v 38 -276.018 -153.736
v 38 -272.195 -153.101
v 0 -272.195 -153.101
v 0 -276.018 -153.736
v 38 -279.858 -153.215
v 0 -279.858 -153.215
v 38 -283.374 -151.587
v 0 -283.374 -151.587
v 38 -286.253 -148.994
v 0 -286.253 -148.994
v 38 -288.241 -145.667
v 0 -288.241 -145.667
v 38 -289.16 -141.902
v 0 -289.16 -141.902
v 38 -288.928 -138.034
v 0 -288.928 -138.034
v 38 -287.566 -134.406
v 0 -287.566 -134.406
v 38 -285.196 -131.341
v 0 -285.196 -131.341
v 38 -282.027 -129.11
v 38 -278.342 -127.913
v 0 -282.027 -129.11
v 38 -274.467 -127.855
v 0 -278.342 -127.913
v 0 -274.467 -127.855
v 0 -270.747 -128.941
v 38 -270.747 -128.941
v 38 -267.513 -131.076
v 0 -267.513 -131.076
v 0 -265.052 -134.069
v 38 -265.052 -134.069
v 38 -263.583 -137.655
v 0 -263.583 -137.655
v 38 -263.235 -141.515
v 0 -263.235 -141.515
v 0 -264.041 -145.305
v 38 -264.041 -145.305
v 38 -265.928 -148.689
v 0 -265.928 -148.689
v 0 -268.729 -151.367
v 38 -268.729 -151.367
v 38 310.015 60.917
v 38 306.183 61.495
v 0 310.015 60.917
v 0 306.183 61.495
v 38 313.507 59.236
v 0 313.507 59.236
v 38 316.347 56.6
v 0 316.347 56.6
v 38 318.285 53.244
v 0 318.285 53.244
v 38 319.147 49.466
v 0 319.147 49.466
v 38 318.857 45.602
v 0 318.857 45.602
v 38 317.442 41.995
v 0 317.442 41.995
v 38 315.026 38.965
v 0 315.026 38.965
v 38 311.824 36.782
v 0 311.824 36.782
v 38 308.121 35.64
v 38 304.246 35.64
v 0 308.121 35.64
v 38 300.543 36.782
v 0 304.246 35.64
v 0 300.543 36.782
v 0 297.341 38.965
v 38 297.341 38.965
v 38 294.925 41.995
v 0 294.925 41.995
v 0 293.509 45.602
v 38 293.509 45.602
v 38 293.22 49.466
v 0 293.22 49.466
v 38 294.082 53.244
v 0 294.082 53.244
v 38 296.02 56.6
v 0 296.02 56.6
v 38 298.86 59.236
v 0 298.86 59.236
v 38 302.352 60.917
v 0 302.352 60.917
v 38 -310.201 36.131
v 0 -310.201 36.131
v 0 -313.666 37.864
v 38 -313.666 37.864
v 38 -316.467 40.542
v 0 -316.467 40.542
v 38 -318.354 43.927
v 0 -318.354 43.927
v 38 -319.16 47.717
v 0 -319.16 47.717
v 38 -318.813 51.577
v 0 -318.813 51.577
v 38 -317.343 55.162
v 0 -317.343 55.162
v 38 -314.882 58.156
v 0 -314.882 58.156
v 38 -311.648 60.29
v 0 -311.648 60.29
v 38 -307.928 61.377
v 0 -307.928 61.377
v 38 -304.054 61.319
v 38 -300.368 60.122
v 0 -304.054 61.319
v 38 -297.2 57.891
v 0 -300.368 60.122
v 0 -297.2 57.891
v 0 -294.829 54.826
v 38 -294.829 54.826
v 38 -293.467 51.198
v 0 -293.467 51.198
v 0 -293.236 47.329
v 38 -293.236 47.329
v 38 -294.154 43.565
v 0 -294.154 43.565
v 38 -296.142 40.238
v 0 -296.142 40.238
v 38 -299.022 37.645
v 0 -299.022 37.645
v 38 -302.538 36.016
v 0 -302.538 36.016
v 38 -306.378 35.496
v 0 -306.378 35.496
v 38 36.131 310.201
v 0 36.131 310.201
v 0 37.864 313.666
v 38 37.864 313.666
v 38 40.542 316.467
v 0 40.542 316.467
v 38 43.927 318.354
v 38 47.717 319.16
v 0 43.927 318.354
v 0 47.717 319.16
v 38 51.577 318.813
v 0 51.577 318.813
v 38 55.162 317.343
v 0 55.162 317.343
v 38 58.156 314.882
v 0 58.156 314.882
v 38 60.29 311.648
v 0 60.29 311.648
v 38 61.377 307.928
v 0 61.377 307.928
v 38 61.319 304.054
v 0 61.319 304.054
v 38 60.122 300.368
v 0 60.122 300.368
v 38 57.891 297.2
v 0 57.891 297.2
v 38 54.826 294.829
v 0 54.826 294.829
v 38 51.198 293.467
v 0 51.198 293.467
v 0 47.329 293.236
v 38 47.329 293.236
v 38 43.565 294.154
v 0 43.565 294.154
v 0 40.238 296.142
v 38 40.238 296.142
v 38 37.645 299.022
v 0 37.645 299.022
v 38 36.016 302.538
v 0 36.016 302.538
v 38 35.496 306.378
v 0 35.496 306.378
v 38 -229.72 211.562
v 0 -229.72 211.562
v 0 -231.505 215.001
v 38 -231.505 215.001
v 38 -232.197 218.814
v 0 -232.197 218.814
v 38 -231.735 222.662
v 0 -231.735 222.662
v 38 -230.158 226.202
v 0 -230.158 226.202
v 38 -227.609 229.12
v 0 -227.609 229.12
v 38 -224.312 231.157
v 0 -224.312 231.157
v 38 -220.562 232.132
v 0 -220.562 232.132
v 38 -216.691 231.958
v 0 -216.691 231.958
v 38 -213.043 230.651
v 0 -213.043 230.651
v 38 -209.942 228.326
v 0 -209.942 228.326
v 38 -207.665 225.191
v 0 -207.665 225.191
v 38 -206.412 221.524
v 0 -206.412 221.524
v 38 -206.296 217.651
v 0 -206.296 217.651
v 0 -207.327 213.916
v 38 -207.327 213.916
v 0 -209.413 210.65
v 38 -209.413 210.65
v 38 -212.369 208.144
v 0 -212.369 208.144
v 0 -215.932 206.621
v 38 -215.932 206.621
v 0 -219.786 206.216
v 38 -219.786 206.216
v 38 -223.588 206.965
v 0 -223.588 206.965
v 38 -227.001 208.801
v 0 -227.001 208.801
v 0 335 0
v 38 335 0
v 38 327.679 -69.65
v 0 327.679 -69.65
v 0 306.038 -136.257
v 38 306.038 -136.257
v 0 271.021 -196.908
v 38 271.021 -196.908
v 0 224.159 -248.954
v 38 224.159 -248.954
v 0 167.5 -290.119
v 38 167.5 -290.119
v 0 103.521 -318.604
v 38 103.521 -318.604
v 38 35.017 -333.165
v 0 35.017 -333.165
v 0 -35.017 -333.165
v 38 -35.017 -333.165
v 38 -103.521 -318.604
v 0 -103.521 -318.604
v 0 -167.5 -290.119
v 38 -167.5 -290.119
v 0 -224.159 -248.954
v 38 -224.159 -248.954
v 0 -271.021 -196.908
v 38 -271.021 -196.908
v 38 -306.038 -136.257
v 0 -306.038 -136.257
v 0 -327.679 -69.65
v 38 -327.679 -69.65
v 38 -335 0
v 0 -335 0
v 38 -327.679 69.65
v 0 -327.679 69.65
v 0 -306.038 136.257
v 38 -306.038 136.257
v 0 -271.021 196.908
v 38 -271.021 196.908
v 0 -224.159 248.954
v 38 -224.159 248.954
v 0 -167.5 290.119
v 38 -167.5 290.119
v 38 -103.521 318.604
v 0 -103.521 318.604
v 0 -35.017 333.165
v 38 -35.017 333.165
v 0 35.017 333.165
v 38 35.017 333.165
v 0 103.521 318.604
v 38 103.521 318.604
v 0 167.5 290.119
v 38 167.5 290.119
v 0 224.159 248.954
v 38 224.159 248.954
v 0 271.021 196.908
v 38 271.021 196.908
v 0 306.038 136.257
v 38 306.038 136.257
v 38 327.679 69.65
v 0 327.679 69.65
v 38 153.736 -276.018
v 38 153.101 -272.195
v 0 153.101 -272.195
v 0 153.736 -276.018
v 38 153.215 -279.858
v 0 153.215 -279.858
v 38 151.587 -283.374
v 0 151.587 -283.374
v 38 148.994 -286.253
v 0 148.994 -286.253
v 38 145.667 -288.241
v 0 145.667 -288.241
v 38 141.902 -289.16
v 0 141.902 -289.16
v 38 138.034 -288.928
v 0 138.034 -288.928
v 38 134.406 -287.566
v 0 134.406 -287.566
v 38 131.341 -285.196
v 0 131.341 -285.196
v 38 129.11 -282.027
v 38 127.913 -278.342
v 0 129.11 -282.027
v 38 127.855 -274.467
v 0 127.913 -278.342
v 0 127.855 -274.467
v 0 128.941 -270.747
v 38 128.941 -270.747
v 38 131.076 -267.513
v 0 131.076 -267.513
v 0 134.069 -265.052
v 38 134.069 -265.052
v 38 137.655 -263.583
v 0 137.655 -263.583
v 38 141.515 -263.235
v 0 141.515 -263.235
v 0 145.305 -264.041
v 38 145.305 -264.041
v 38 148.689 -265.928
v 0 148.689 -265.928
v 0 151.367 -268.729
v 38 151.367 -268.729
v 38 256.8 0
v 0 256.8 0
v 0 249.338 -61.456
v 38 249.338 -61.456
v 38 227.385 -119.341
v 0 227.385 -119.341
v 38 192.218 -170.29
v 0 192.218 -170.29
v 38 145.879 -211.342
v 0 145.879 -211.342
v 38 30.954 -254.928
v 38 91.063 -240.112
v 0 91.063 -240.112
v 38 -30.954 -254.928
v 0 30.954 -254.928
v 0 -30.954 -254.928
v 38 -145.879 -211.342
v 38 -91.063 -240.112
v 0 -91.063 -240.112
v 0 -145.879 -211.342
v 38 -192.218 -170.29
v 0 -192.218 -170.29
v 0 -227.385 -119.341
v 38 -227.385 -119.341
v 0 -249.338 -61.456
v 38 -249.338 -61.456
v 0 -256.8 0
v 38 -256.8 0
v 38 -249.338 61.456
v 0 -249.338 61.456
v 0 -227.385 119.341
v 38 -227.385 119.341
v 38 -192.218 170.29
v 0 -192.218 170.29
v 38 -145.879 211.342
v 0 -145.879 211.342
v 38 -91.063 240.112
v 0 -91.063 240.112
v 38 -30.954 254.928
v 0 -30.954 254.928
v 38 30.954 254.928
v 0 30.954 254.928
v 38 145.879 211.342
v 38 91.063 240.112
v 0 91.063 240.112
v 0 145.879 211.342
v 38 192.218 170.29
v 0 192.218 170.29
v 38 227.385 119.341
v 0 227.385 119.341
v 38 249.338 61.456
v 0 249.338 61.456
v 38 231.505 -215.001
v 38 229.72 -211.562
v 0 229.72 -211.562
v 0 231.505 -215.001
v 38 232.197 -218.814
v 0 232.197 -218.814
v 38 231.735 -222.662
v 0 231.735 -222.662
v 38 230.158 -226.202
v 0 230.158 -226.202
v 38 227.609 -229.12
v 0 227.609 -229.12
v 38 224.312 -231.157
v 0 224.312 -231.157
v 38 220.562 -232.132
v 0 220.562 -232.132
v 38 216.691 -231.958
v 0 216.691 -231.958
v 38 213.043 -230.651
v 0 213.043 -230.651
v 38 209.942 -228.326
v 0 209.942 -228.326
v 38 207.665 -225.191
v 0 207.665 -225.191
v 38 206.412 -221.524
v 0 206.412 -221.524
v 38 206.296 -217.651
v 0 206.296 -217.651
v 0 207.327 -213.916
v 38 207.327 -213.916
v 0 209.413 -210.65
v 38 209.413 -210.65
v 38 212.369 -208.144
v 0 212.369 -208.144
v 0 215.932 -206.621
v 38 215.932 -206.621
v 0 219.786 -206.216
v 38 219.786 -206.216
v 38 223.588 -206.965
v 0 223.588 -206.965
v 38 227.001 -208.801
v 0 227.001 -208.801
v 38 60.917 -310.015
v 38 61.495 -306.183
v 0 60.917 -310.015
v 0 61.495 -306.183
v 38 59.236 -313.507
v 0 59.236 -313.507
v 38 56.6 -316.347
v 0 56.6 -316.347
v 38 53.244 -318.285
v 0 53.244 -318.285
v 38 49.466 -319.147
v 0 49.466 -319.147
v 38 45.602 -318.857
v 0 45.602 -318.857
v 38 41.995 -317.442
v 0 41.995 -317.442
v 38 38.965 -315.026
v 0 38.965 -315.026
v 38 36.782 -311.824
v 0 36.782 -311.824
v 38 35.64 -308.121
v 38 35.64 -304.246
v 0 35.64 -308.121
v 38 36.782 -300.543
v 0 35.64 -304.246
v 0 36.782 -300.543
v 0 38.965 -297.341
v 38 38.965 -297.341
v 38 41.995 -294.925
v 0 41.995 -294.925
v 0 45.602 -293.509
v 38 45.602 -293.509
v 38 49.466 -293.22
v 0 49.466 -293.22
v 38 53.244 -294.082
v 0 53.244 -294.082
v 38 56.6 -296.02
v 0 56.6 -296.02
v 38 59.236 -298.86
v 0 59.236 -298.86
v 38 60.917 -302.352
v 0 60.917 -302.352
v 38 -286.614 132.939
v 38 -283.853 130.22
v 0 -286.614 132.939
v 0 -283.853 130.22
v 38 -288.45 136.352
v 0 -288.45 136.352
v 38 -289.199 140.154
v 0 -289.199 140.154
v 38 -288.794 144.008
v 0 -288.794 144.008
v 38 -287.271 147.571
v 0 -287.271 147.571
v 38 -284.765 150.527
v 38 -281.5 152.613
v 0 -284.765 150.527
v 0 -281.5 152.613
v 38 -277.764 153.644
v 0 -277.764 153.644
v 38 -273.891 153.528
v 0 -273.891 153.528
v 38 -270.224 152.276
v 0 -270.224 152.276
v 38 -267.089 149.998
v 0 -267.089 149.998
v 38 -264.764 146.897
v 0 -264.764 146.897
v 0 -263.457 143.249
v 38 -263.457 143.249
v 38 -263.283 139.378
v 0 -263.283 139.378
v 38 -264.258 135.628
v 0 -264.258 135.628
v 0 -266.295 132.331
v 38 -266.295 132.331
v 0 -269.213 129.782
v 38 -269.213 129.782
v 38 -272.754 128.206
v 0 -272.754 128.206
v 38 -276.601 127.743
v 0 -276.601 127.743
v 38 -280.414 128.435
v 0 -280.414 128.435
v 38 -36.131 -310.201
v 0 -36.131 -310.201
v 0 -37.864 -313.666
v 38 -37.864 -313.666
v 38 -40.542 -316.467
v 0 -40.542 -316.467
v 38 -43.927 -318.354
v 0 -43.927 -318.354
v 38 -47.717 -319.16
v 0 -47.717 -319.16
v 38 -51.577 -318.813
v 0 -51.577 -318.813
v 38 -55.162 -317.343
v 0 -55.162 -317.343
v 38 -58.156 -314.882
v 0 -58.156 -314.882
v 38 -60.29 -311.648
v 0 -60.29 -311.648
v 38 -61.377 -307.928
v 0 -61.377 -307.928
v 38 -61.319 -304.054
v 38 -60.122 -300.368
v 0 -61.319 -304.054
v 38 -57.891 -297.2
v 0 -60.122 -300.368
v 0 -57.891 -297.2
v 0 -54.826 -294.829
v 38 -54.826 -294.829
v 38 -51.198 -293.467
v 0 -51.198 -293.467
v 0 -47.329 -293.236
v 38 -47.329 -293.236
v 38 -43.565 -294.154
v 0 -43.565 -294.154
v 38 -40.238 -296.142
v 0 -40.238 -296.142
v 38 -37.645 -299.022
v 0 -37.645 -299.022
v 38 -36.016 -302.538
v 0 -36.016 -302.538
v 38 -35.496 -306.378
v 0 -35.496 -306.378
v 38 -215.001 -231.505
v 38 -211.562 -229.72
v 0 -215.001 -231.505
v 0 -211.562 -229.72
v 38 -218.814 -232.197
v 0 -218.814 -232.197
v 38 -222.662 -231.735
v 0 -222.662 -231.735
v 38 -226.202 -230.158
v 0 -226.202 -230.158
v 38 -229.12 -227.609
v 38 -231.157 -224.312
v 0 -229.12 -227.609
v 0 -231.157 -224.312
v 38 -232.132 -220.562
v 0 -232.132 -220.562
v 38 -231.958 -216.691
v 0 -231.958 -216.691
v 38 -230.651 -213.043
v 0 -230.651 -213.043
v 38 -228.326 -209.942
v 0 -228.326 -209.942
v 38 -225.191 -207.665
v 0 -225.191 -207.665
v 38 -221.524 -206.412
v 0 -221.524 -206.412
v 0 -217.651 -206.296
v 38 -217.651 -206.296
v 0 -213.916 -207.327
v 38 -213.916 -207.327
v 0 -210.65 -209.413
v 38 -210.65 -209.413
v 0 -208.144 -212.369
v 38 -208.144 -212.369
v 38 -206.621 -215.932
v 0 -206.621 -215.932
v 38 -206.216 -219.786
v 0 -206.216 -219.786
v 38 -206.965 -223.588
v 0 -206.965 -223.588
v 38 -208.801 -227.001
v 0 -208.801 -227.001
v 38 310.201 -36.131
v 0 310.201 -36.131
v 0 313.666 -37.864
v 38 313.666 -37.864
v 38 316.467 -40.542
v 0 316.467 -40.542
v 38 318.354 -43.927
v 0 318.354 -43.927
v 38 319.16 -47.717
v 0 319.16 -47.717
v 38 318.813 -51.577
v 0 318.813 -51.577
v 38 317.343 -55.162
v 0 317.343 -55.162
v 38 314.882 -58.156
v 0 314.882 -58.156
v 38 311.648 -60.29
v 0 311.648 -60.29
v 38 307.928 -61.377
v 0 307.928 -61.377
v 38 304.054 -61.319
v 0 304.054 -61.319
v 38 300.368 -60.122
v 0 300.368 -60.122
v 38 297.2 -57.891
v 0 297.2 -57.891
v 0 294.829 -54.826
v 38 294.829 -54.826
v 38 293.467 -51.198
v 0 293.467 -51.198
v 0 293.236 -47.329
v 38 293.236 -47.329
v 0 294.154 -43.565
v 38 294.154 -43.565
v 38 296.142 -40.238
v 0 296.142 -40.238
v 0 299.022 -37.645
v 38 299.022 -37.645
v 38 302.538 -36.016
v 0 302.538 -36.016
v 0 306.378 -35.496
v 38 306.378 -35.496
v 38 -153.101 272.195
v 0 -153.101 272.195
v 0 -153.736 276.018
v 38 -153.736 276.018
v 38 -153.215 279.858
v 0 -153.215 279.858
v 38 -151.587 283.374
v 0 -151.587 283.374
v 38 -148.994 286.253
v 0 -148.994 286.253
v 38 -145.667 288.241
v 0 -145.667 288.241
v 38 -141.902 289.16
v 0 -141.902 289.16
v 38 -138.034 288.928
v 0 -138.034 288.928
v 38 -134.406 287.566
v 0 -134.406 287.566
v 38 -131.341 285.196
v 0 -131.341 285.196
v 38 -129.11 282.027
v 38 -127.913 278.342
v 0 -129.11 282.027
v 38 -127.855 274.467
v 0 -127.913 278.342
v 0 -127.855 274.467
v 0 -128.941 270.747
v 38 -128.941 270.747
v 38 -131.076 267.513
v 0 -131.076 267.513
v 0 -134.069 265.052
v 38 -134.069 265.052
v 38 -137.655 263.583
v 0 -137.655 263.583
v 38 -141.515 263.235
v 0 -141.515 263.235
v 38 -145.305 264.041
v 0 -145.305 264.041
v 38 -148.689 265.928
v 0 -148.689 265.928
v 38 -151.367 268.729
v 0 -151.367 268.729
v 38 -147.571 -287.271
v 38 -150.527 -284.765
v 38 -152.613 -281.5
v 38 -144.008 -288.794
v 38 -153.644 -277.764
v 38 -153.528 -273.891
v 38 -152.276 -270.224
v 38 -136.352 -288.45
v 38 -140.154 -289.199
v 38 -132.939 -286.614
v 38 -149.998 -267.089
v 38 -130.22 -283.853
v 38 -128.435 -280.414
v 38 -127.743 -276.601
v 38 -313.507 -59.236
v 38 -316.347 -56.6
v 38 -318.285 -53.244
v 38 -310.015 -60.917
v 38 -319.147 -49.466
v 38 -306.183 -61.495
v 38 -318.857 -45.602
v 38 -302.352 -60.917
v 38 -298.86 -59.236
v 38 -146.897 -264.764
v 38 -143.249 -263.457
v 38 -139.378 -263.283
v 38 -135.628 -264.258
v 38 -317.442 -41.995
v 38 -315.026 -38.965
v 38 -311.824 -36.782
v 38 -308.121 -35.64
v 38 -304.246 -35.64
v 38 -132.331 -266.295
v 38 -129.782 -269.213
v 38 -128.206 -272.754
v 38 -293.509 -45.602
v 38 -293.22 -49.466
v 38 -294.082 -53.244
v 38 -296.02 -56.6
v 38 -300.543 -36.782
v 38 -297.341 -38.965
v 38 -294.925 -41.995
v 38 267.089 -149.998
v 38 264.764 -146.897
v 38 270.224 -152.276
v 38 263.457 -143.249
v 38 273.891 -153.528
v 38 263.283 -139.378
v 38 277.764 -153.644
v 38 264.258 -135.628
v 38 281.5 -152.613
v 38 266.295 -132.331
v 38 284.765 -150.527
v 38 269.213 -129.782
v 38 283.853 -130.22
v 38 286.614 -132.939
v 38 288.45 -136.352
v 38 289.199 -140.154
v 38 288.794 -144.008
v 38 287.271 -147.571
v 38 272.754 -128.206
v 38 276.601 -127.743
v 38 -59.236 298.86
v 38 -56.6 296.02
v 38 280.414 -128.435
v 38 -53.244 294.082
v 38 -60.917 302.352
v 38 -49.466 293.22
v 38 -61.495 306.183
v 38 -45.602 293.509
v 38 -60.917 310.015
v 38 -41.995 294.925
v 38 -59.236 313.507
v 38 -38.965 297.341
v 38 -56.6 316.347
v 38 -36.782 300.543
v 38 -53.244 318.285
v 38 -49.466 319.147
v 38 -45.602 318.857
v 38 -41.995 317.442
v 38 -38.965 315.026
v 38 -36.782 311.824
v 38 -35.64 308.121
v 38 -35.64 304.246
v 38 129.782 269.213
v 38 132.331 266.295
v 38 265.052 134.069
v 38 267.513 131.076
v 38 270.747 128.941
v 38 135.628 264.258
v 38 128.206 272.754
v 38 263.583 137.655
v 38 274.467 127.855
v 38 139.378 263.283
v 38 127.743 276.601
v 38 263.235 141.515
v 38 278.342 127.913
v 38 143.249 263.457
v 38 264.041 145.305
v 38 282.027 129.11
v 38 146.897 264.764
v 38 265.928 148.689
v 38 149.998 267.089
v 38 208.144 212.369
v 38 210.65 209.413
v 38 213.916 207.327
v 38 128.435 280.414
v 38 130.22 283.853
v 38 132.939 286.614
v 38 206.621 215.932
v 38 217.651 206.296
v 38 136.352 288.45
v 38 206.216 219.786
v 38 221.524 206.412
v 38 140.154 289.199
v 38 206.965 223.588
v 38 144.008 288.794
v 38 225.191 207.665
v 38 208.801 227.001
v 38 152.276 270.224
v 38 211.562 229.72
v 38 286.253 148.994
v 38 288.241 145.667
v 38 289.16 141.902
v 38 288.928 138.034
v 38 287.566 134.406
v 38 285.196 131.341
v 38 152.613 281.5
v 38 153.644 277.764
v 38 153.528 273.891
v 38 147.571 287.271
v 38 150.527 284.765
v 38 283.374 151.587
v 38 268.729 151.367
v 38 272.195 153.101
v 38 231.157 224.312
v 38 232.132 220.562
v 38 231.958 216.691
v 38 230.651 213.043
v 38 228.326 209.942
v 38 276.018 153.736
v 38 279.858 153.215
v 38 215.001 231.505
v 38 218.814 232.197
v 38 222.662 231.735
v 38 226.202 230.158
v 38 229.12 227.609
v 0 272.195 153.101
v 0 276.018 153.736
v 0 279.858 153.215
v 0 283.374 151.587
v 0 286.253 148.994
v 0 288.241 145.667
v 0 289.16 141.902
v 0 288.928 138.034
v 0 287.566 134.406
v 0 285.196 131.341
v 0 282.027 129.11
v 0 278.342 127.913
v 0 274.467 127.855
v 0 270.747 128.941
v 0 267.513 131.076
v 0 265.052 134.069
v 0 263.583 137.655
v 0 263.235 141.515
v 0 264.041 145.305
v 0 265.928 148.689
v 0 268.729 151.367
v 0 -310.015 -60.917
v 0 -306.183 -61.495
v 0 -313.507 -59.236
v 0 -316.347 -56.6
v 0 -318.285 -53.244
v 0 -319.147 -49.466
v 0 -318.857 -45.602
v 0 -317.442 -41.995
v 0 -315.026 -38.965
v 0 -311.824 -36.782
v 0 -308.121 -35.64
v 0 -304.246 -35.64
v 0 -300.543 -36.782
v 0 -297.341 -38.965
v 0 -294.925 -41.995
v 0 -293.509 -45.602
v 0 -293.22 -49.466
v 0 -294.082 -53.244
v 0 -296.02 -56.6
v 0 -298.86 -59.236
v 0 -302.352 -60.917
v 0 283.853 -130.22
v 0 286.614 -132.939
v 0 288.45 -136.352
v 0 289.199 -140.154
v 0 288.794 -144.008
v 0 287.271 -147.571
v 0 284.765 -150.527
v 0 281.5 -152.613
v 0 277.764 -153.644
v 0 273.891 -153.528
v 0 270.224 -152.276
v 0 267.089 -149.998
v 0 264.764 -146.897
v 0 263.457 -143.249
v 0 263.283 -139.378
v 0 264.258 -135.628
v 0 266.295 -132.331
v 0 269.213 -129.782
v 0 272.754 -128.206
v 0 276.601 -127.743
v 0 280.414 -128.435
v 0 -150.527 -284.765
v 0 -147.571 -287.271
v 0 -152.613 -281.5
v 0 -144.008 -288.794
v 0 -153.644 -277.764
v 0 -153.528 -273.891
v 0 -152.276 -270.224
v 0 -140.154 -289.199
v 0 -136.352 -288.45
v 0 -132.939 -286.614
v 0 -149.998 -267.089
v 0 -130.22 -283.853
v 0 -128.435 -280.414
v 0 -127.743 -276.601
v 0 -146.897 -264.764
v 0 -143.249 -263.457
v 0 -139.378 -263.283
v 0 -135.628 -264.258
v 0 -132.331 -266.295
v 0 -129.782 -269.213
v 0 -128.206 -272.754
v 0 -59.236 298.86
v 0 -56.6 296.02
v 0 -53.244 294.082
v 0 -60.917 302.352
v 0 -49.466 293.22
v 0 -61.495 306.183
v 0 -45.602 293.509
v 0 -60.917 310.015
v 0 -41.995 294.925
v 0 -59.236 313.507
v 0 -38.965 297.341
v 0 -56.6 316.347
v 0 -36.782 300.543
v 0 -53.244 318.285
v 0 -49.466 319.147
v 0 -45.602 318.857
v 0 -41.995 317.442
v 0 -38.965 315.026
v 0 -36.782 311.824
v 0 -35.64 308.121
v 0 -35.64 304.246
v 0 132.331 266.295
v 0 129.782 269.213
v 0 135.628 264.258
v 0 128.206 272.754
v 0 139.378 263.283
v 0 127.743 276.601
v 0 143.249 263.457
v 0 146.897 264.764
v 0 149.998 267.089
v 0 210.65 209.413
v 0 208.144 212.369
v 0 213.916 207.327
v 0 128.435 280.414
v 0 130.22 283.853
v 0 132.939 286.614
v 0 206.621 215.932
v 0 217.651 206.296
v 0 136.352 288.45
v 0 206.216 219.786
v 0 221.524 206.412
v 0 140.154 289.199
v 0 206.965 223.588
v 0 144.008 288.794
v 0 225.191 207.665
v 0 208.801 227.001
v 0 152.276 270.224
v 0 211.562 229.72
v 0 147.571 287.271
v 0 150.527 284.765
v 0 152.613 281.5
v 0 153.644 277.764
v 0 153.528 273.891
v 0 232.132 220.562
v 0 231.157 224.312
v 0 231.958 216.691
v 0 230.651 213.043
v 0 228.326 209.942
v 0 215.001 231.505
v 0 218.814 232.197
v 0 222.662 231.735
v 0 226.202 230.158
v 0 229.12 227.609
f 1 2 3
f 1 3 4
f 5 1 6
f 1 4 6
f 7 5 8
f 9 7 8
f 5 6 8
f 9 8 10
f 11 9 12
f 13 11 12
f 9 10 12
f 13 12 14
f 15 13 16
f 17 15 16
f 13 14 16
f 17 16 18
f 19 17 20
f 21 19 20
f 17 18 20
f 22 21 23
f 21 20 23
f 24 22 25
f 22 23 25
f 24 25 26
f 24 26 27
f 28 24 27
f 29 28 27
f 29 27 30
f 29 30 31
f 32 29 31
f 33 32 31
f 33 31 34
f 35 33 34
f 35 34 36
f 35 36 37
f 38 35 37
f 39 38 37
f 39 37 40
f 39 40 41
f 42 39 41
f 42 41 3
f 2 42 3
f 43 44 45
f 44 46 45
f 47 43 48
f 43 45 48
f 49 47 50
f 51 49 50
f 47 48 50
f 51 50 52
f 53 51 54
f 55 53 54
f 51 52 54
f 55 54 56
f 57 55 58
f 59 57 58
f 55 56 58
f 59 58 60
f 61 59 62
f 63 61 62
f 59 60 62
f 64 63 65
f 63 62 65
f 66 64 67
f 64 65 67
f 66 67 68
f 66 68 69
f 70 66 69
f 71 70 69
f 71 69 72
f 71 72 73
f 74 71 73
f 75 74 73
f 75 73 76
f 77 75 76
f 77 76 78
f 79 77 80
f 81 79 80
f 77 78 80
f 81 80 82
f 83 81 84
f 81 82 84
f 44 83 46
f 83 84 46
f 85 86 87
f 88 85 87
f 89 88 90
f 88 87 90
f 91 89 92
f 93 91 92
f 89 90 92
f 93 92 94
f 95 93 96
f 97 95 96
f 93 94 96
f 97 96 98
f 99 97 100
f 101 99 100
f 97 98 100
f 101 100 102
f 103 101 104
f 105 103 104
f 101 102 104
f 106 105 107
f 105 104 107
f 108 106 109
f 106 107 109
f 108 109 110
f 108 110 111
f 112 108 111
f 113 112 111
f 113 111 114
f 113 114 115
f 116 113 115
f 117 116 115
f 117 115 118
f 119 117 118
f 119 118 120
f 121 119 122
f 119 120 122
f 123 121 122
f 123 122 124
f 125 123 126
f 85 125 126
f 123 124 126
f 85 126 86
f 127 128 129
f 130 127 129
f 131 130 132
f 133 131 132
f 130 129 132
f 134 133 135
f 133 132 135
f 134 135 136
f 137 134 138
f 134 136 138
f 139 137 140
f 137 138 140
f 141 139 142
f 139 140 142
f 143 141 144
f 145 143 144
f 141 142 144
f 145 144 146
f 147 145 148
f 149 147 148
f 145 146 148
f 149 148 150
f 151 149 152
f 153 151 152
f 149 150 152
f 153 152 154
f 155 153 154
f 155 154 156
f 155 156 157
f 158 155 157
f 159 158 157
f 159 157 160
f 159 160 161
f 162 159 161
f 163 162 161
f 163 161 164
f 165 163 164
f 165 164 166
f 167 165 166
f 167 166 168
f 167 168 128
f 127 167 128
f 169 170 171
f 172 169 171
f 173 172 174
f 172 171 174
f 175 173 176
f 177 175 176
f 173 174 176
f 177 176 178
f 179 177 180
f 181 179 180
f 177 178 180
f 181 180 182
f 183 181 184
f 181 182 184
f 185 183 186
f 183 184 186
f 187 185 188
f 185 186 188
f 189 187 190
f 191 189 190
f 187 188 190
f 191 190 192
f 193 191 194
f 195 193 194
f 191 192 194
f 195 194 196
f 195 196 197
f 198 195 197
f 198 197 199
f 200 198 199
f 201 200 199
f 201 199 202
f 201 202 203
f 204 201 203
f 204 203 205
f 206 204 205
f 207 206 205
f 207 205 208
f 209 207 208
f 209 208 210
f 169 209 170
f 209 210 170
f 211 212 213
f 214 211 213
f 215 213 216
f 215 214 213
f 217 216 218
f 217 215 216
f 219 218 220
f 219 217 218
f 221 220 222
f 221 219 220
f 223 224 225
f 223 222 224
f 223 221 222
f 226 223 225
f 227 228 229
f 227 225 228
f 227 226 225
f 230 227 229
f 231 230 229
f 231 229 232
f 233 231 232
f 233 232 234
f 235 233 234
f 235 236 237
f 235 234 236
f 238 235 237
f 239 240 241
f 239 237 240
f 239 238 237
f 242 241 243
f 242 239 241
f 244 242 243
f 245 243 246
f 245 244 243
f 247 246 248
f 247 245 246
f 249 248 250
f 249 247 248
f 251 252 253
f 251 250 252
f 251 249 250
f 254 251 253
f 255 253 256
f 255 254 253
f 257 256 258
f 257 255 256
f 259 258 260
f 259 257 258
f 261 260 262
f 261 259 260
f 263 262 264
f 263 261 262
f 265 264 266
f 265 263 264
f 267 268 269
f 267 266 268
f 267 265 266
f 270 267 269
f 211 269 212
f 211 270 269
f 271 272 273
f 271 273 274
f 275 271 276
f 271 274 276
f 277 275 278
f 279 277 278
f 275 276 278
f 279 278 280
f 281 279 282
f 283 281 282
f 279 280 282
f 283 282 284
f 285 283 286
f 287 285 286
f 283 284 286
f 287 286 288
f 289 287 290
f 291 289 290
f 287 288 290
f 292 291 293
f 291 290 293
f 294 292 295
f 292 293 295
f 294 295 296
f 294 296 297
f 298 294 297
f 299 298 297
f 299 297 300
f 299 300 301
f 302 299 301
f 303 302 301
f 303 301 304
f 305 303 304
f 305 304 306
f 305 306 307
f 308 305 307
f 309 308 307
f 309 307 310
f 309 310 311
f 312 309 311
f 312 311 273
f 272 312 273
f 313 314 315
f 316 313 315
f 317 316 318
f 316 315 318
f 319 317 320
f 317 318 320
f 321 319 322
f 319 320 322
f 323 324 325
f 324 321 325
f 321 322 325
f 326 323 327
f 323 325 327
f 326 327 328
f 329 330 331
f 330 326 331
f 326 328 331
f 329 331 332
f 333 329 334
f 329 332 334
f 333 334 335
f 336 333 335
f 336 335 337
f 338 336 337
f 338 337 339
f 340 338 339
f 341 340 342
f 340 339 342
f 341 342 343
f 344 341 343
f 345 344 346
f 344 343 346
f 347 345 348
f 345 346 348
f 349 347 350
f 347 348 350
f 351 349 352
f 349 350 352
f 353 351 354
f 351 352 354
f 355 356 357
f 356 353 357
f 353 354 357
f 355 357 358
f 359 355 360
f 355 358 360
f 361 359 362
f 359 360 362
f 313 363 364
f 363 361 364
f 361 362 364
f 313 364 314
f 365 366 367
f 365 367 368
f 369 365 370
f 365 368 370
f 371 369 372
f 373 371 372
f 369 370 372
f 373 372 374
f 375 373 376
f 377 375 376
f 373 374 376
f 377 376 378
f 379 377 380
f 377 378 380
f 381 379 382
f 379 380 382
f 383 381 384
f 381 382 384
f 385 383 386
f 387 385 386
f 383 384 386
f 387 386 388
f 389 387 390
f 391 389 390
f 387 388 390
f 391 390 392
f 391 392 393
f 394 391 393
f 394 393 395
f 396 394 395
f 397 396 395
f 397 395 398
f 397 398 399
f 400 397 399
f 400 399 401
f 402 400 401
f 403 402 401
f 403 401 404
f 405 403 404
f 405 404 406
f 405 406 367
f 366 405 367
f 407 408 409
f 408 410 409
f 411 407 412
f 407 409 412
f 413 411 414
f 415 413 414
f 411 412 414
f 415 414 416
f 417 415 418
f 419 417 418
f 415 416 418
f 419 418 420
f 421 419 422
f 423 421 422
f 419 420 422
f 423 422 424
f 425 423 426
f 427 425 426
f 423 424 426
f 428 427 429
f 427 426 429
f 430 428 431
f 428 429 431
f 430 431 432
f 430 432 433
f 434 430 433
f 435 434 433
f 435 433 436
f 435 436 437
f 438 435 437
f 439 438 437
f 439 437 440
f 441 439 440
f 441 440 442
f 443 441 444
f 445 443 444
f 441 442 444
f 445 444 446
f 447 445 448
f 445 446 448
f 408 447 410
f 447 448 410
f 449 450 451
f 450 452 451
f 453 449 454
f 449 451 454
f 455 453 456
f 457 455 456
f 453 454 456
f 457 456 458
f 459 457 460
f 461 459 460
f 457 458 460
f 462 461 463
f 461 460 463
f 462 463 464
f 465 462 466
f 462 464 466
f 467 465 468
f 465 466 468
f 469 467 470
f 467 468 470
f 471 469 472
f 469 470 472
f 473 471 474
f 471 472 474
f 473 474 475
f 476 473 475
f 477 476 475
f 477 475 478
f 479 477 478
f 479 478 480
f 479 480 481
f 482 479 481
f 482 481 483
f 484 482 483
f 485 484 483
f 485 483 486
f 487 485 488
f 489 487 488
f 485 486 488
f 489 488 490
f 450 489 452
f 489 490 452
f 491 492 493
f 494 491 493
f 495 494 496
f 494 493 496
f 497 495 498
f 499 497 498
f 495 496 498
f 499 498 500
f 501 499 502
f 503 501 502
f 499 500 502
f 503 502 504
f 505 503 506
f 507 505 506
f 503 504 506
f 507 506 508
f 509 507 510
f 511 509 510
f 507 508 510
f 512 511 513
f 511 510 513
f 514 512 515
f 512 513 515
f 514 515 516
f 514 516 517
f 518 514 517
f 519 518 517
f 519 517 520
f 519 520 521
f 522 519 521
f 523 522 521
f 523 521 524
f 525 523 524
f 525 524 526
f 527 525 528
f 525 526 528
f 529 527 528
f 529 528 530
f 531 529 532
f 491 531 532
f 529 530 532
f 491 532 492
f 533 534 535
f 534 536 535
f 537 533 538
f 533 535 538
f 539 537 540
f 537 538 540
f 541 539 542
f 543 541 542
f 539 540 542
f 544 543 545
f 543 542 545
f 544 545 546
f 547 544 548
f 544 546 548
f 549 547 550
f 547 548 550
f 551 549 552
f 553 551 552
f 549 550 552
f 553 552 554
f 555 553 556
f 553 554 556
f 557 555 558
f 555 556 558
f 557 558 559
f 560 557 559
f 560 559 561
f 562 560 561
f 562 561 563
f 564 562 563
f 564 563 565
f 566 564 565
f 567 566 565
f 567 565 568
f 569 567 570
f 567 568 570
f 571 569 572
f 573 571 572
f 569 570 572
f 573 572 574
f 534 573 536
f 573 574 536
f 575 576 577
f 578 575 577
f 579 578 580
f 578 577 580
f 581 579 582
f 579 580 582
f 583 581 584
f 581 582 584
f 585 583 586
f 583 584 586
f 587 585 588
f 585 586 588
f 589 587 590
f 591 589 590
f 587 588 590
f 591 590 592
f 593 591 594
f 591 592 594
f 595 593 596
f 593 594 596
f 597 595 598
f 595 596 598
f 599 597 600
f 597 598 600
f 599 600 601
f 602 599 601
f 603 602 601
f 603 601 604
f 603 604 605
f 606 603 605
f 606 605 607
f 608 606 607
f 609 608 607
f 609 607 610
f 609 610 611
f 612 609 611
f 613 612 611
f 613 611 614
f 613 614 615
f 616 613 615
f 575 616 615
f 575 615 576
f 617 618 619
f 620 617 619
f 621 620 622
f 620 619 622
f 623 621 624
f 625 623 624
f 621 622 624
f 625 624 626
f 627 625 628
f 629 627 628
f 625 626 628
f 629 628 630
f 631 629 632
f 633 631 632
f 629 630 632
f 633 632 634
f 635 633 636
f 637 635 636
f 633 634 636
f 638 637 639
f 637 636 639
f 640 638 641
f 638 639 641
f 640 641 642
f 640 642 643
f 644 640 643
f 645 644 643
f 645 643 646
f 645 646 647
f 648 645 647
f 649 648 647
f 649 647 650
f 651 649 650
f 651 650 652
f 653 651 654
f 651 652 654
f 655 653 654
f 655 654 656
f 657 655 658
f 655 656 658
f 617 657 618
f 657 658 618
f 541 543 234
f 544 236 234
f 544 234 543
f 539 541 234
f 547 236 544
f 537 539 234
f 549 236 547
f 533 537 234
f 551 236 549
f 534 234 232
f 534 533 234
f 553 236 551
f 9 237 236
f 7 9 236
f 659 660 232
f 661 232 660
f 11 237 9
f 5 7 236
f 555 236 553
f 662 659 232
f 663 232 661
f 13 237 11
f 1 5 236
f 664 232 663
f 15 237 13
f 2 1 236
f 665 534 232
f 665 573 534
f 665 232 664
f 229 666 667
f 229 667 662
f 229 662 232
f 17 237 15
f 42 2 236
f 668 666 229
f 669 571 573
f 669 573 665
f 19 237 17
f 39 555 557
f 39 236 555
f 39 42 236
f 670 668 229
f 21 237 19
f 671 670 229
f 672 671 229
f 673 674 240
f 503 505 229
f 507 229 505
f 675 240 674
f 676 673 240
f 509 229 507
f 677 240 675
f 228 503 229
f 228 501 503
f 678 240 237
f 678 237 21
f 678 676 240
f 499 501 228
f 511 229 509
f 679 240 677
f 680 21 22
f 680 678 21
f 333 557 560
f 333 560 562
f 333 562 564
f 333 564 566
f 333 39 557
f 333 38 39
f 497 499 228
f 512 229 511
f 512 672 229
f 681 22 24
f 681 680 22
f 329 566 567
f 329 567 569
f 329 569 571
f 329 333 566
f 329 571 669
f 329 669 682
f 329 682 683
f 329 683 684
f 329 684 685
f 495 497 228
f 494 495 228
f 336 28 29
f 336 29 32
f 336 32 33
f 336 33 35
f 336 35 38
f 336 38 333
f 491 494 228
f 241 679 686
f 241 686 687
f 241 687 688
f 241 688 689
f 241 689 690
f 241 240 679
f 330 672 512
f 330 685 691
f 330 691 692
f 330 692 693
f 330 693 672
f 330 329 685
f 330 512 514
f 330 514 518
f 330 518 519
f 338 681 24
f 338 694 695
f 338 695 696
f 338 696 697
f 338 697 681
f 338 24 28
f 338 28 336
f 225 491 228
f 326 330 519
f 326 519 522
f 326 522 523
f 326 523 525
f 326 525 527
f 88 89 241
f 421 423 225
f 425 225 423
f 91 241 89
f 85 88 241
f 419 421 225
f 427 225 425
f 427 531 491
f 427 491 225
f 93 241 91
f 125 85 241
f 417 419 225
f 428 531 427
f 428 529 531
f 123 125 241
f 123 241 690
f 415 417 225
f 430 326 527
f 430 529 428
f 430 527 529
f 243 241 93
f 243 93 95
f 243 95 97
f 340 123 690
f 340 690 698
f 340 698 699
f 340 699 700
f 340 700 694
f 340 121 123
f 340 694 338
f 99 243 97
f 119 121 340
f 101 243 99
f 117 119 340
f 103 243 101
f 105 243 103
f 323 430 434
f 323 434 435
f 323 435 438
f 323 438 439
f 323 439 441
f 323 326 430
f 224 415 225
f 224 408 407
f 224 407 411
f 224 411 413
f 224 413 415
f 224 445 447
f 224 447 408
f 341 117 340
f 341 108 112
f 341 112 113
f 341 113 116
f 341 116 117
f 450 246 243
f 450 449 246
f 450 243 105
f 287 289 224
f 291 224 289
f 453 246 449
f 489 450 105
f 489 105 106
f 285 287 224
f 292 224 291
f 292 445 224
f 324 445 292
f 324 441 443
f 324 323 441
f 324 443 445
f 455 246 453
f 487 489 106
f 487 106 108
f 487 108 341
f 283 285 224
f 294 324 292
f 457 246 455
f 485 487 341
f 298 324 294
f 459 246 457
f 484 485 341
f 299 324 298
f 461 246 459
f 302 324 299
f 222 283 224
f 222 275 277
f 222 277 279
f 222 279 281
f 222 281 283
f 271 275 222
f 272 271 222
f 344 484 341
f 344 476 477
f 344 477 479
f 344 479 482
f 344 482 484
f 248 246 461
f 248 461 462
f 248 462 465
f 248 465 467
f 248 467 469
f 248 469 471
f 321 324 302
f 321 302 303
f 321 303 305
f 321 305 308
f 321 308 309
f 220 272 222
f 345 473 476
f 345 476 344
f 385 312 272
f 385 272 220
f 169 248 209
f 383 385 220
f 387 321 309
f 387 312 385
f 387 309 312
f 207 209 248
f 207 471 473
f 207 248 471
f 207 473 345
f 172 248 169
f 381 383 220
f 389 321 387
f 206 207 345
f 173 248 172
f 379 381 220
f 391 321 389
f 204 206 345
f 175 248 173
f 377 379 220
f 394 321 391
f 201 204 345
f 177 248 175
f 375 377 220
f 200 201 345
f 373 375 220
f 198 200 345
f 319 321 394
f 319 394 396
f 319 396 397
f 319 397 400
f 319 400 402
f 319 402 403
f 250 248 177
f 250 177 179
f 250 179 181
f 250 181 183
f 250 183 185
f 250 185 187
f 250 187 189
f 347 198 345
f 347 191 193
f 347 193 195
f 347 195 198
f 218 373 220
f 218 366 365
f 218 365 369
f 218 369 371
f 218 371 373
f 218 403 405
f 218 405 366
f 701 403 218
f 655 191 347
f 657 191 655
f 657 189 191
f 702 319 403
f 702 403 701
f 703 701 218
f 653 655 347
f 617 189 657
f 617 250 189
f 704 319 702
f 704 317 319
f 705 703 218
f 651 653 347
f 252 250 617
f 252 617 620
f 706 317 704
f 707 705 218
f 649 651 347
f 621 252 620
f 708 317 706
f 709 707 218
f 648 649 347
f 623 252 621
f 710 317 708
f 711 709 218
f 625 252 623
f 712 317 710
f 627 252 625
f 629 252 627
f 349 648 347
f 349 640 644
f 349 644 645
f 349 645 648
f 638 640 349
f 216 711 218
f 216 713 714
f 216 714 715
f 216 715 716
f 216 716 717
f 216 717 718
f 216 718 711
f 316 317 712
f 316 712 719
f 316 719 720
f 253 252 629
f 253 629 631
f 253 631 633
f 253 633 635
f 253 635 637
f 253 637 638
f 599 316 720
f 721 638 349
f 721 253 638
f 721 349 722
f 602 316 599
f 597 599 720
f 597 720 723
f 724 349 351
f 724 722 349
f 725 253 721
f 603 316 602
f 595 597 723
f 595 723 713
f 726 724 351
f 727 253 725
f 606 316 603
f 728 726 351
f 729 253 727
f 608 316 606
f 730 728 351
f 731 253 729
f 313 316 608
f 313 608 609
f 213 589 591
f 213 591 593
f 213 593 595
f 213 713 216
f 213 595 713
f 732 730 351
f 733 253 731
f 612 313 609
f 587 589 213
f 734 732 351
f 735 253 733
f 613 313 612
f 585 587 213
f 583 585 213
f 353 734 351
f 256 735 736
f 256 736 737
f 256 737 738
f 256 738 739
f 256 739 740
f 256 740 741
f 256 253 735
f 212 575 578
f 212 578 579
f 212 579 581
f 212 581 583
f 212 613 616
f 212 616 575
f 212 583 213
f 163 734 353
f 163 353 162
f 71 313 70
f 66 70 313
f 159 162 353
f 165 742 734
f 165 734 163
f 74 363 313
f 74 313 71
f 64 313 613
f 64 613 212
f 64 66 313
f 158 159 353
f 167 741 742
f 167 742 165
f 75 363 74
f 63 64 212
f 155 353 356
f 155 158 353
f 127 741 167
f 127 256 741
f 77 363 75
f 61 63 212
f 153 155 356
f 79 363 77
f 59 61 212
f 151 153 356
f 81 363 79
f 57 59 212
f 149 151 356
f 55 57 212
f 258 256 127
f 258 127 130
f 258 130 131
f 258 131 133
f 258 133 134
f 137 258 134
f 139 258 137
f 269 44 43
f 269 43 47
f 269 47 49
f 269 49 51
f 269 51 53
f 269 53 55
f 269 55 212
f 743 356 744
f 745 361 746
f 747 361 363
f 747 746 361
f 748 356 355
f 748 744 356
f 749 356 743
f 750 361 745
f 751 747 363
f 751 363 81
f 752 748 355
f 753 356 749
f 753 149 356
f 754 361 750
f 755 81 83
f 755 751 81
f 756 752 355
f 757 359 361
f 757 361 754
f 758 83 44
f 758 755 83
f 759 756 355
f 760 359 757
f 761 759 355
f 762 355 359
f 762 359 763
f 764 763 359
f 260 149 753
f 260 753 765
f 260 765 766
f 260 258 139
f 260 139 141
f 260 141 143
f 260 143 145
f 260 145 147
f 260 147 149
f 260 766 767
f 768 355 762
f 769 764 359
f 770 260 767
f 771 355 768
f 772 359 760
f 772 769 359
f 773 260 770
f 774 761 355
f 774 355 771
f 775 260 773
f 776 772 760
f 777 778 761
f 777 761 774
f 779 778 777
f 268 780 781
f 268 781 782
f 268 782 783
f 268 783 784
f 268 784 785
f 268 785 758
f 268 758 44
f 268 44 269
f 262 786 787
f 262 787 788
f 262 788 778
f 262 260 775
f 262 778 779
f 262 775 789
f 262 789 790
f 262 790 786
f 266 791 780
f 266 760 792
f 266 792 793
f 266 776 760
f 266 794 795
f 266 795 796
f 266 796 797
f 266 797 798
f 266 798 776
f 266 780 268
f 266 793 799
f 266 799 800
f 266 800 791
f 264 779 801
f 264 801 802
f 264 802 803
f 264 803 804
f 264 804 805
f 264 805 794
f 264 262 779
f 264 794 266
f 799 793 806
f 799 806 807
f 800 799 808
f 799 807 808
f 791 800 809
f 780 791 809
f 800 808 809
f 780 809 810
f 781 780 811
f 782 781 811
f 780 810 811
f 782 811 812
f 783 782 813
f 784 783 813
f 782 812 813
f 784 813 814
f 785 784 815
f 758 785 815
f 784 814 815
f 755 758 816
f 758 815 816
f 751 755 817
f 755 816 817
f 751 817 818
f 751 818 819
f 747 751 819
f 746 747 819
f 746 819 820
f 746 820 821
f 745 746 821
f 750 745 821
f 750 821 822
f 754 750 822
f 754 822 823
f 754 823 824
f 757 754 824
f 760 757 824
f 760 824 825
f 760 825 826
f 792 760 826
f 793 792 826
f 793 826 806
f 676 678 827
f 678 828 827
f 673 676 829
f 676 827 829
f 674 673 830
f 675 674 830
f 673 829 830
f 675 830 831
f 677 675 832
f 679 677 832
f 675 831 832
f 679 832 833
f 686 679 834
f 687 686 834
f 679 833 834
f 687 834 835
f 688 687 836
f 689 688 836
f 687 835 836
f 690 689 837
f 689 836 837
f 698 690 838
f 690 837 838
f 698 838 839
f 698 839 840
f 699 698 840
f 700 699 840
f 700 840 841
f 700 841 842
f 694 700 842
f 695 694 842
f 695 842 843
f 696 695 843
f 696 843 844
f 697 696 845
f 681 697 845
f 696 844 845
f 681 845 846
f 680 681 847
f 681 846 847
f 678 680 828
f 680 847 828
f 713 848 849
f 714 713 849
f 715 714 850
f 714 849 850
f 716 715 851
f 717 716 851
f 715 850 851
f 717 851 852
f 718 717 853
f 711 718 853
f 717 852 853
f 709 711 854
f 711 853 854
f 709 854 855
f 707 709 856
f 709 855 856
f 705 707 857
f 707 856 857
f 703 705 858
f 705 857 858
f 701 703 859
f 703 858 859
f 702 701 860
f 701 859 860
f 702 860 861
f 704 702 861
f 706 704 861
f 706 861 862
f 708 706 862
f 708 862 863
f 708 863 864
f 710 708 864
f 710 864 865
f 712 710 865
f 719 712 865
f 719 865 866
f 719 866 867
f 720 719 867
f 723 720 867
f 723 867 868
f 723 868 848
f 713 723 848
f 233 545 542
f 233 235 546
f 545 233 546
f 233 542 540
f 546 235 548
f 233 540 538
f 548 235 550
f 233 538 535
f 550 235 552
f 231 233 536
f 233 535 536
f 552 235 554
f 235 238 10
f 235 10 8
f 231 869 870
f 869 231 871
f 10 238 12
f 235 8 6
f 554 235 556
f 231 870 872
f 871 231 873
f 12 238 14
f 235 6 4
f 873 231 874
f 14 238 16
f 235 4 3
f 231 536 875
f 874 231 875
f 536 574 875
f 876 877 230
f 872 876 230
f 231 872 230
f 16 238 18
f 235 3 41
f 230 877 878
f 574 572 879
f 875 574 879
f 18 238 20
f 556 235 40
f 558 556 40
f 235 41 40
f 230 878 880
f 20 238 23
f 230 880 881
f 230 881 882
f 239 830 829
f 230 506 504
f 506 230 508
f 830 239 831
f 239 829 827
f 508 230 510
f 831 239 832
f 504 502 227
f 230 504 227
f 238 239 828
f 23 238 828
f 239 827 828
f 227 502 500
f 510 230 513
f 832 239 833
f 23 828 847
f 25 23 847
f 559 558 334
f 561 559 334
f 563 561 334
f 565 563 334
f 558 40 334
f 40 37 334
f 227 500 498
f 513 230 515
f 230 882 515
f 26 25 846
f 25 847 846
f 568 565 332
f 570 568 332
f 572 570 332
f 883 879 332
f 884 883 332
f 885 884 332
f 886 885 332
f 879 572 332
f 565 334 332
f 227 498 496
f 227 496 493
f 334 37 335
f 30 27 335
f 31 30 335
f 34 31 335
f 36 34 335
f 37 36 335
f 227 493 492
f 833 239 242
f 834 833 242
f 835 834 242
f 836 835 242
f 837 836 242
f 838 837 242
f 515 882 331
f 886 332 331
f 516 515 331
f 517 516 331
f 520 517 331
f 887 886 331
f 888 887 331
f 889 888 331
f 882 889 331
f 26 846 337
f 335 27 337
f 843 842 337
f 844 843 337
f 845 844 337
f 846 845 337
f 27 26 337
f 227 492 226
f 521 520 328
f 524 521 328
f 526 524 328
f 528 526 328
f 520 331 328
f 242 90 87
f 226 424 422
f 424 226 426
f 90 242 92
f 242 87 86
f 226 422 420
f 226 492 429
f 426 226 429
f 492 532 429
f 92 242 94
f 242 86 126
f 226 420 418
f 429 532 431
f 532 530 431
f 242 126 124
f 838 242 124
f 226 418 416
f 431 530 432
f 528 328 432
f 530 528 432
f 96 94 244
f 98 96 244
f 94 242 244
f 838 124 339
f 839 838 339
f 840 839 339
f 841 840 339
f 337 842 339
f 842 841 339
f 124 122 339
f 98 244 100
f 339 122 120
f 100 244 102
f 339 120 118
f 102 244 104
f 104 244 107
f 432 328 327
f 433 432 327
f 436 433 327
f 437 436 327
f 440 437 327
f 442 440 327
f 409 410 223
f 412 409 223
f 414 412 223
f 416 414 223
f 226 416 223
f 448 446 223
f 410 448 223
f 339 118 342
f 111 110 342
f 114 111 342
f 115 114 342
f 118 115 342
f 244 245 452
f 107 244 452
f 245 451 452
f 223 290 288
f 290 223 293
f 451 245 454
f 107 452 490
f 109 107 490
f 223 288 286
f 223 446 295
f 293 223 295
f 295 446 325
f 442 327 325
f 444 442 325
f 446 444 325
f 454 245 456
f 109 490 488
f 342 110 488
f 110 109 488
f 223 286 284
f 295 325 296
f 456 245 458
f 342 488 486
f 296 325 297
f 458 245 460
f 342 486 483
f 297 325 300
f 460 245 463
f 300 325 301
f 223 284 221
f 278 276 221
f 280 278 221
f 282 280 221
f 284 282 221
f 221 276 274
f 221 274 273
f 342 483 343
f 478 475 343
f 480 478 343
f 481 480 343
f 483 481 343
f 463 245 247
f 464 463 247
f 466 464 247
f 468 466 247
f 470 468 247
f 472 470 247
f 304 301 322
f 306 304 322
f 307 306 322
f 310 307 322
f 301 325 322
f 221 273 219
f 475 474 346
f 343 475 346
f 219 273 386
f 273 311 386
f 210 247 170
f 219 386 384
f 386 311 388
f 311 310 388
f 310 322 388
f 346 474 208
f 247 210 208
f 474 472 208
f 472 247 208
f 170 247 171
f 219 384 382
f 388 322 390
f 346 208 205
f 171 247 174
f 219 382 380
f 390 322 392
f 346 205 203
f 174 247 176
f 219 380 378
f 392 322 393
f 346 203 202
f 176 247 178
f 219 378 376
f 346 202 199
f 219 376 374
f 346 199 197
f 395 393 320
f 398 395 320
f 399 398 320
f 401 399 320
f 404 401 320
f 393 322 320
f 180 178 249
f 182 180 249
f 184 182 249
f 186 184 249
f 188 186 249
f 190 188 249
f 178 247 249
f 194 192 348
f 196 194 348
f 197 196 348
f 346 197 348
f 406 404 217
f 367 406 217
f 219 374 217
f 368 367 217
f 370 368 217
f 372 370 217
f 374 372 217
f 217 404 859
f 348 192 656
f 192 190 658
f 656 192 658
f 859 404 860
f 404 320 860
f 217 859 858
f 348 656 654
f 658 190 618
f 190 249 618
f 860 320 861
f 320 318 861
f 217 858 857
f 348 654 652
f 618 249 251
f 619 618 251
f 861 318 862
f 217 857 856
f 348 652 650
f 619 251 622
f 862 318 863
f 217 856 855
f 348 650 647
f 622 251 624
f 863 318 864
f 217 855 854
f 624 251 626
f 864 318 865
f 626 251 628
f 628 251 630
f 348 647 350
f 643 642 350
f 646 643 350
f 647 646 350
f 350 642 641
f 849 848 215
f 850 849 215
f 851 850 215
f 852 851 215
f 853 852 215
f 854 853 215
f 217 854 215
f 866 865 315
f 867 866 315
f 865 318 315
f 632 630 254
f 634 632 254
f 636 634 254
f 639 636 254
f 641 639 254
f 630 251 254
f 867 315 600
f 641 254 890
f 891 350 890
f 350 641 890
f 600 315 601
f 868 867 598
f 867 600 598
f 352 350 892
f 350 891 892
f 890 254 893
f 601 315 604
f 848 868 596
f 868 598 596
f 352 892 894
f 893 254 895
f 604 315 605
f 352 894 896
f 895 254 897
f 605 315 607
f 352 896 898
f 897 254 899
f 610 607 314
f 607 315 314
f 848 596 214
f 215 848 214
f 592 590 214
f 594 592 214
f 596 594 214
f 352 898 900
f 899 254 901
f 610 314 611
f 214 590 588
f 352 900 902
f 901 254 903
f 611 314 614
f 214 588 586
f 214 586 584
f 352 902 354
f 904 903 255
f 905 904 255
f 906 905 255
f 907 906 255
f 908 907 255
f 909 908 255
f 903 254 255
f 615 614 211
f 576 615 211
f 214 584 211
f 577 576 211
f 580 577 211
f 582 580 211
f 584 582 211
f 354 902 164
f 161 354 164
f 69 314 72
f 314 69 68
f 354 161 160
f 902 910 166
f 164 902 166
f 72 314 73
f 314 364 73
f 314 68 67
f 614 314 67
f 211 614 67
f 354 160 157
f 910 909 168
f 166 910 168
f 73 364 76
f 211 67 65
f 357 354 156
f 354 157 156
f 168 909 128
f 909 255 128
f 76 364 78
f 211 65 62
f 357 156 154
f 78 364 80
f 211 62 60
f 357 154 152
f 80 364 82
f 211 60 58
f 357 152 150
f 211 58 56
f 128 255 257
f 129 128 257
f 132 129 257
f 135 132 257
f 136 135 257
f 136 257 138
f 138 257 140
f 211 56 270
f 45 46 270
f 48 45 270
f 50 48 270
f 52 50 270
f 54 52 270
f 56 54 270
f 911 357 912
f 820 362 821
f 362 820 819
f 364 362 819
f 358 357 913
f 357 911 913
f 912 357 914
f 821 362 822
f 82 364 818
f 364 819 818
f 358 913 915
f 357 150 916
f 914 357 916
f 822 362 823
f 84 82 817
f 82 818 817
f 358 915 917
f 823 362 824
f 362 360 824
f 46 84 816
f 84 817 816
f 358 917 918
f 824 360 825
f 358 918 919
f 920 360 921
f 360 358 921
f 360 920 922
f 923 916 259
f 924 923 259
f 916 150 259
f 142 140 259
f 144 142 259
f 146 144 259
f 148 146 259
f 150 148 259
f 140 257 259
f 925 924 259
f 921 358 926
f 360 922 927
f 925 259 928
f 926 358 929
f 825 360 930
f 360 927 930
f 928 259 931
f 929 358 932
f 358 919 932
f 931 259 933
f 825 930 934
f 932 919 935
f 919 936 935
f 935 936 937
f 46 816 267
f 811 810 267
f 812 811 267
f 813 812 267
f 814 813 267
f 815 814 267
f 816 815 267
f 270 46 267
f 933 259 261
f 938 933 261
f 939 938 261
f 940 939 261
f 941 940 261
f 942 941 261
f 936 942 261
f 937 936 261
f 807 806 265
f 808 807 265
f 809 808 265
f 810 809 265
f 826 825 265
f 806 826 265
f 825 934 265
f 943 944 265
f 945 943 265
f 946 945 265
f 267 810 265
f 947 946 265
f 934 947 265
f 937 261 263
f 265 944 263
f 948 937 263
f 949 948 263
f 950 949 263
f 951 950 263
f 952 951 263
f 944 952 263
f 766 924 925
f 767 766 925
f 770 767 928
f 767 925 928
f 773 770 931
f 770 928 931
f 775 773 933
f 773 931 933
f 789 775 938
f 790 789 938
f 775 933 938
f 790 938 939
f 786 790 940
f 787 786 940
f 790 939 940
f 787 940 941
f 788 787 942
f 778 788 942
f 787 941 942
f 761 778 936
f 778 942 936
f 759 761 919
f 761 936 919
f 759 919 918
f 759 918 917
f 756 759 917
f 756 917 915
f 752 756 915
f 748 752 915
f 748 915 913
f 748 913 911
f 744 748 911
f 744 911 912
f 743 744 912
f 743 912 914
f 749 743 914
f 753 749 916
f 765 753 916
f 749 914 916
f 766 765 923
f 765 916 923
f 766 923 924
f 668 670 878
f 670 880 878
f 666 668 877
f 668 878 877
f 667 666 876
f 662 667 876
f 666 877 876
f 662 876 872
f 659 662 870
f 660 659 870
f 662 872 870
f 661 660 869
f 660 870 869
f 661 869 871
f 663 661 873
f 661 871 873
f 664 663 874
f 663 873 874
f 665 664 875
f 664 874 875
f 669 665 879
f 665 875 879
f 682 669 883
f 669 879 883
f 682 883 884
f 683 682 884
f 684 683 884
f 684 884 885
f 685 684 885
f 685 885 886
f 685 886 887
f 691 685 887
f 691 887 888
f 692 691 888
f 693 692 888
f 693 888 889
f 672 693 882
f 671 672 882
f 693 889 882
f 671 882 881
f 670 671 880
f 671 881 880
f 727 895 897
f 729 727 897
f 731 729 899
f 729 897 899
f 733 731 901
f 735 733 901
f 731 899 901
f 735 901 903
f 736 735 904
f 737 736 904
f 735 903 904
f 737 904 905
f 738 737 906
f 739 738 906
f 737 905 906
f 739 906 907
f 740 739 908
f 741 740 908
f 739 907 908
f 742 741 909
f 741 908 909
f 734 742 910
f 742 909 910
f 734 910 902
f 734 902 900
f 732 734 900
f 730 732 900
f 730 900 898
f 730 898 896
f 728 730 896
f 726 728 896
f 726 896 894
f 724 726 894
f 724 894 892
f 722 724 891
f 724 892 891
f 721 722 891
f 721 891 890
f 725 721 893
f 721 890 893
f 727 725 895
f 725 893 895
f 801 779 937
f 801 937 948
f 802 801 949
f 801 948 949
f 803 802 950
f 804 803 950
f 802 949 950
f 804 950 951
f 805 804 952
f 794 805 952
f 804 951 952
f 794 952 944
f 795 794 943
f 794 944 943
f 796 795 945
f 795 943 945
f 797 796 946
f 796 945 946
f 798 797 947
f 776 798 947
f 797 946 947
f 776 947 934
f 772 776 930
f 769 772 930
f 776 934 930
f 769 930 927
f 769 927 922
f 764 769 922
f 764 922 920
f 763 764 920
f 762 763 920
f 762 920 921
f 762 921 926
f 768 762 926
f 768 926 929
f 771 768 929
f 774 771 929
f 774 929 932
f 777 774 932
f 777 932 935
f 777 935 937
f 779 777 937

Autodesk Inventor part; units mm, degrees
ref_plane "YZ Plane" through (0, 0, 0) normal (1, 0, 0) x (0, 1, 0)
ref_plane "XZ Plane" through (0, 0, 0) normal (0, 1, 0) x (-1, 0, 0)
ref_plane "XY Plane" through (0, 0, 0) normal (0, 0, 1) x (1, 0, 0)
sketch "Sketch1" plane through (0, 0, 0) normal (0, 0, 1) x (1, 0, 0)
  line L0 (38, 335) -> (0, 335)
  line L1 (0, 335) -> (0, 256.8)
  line L2 (0, 256.8) -> (0, 0) construction
  line L3 (0, 0) -> (38, 0) construction
  line L4 (38, 335) -> (38, 256.8)
  line L5 (38, 256.8) -> (0, 256.8)
  line L6 (38, 256.8) -> (38, 0) construction
  dimension "d0" = 670
  dimension "d1" = 38
  dimension "d5" = 513.6
revolve "Revolution1" add sketch "Sketch1" angle 360 about axis through (0, 0, 0) along (1, 0, 0)
sketch "Sketch2" plane through (0, 0, 0) normal (-1, 0, 0) x (0, 0, 1)
  circle A0 centre (0, 0) radius 256.8 projected
  line L0 (0, 310) -> (0, 0) construction
  circle A1 centre (0, 0) radius 335 projected
  circle A2 centre (0, 0) radius 310 construction
  line L1 (0, 0) -> (48.4947, 306.1834) construction
  circle A3 centre (48.4947, 306.1834) radius 13
  dimension "d6" = 26
  dimension "d7" = 310
  dimension "d8" = 9
extrude "Extrusion1" cut sketch "Sketch2" against normal through all contours A3
pattern_circular "Circular Pattern1" count 20 over 360 about axis through (19, 0, 0) along (1, 0, 0) of "Extrusion1"
equation "\"d6\" = dd2"
equation "\"d7\" = 0.5 * k"
equation "\"d0\" = D"
equation "\"d1\" = b"
equation "\"d5\" = dd5"
equation "\"b\" = 38"
equation "\"D\" = 670"
equation "\"dd2\" = 26"
equation "\"dd5\" = 513.6"
equation "\"Size_Designation\" = 1.2345"
equation "\"k\" = 620"
properties part number "DIN 2576 Slip-On Flange for Welding Series 1 (ISO) - PN 10 500 x 508" material "Steel"
